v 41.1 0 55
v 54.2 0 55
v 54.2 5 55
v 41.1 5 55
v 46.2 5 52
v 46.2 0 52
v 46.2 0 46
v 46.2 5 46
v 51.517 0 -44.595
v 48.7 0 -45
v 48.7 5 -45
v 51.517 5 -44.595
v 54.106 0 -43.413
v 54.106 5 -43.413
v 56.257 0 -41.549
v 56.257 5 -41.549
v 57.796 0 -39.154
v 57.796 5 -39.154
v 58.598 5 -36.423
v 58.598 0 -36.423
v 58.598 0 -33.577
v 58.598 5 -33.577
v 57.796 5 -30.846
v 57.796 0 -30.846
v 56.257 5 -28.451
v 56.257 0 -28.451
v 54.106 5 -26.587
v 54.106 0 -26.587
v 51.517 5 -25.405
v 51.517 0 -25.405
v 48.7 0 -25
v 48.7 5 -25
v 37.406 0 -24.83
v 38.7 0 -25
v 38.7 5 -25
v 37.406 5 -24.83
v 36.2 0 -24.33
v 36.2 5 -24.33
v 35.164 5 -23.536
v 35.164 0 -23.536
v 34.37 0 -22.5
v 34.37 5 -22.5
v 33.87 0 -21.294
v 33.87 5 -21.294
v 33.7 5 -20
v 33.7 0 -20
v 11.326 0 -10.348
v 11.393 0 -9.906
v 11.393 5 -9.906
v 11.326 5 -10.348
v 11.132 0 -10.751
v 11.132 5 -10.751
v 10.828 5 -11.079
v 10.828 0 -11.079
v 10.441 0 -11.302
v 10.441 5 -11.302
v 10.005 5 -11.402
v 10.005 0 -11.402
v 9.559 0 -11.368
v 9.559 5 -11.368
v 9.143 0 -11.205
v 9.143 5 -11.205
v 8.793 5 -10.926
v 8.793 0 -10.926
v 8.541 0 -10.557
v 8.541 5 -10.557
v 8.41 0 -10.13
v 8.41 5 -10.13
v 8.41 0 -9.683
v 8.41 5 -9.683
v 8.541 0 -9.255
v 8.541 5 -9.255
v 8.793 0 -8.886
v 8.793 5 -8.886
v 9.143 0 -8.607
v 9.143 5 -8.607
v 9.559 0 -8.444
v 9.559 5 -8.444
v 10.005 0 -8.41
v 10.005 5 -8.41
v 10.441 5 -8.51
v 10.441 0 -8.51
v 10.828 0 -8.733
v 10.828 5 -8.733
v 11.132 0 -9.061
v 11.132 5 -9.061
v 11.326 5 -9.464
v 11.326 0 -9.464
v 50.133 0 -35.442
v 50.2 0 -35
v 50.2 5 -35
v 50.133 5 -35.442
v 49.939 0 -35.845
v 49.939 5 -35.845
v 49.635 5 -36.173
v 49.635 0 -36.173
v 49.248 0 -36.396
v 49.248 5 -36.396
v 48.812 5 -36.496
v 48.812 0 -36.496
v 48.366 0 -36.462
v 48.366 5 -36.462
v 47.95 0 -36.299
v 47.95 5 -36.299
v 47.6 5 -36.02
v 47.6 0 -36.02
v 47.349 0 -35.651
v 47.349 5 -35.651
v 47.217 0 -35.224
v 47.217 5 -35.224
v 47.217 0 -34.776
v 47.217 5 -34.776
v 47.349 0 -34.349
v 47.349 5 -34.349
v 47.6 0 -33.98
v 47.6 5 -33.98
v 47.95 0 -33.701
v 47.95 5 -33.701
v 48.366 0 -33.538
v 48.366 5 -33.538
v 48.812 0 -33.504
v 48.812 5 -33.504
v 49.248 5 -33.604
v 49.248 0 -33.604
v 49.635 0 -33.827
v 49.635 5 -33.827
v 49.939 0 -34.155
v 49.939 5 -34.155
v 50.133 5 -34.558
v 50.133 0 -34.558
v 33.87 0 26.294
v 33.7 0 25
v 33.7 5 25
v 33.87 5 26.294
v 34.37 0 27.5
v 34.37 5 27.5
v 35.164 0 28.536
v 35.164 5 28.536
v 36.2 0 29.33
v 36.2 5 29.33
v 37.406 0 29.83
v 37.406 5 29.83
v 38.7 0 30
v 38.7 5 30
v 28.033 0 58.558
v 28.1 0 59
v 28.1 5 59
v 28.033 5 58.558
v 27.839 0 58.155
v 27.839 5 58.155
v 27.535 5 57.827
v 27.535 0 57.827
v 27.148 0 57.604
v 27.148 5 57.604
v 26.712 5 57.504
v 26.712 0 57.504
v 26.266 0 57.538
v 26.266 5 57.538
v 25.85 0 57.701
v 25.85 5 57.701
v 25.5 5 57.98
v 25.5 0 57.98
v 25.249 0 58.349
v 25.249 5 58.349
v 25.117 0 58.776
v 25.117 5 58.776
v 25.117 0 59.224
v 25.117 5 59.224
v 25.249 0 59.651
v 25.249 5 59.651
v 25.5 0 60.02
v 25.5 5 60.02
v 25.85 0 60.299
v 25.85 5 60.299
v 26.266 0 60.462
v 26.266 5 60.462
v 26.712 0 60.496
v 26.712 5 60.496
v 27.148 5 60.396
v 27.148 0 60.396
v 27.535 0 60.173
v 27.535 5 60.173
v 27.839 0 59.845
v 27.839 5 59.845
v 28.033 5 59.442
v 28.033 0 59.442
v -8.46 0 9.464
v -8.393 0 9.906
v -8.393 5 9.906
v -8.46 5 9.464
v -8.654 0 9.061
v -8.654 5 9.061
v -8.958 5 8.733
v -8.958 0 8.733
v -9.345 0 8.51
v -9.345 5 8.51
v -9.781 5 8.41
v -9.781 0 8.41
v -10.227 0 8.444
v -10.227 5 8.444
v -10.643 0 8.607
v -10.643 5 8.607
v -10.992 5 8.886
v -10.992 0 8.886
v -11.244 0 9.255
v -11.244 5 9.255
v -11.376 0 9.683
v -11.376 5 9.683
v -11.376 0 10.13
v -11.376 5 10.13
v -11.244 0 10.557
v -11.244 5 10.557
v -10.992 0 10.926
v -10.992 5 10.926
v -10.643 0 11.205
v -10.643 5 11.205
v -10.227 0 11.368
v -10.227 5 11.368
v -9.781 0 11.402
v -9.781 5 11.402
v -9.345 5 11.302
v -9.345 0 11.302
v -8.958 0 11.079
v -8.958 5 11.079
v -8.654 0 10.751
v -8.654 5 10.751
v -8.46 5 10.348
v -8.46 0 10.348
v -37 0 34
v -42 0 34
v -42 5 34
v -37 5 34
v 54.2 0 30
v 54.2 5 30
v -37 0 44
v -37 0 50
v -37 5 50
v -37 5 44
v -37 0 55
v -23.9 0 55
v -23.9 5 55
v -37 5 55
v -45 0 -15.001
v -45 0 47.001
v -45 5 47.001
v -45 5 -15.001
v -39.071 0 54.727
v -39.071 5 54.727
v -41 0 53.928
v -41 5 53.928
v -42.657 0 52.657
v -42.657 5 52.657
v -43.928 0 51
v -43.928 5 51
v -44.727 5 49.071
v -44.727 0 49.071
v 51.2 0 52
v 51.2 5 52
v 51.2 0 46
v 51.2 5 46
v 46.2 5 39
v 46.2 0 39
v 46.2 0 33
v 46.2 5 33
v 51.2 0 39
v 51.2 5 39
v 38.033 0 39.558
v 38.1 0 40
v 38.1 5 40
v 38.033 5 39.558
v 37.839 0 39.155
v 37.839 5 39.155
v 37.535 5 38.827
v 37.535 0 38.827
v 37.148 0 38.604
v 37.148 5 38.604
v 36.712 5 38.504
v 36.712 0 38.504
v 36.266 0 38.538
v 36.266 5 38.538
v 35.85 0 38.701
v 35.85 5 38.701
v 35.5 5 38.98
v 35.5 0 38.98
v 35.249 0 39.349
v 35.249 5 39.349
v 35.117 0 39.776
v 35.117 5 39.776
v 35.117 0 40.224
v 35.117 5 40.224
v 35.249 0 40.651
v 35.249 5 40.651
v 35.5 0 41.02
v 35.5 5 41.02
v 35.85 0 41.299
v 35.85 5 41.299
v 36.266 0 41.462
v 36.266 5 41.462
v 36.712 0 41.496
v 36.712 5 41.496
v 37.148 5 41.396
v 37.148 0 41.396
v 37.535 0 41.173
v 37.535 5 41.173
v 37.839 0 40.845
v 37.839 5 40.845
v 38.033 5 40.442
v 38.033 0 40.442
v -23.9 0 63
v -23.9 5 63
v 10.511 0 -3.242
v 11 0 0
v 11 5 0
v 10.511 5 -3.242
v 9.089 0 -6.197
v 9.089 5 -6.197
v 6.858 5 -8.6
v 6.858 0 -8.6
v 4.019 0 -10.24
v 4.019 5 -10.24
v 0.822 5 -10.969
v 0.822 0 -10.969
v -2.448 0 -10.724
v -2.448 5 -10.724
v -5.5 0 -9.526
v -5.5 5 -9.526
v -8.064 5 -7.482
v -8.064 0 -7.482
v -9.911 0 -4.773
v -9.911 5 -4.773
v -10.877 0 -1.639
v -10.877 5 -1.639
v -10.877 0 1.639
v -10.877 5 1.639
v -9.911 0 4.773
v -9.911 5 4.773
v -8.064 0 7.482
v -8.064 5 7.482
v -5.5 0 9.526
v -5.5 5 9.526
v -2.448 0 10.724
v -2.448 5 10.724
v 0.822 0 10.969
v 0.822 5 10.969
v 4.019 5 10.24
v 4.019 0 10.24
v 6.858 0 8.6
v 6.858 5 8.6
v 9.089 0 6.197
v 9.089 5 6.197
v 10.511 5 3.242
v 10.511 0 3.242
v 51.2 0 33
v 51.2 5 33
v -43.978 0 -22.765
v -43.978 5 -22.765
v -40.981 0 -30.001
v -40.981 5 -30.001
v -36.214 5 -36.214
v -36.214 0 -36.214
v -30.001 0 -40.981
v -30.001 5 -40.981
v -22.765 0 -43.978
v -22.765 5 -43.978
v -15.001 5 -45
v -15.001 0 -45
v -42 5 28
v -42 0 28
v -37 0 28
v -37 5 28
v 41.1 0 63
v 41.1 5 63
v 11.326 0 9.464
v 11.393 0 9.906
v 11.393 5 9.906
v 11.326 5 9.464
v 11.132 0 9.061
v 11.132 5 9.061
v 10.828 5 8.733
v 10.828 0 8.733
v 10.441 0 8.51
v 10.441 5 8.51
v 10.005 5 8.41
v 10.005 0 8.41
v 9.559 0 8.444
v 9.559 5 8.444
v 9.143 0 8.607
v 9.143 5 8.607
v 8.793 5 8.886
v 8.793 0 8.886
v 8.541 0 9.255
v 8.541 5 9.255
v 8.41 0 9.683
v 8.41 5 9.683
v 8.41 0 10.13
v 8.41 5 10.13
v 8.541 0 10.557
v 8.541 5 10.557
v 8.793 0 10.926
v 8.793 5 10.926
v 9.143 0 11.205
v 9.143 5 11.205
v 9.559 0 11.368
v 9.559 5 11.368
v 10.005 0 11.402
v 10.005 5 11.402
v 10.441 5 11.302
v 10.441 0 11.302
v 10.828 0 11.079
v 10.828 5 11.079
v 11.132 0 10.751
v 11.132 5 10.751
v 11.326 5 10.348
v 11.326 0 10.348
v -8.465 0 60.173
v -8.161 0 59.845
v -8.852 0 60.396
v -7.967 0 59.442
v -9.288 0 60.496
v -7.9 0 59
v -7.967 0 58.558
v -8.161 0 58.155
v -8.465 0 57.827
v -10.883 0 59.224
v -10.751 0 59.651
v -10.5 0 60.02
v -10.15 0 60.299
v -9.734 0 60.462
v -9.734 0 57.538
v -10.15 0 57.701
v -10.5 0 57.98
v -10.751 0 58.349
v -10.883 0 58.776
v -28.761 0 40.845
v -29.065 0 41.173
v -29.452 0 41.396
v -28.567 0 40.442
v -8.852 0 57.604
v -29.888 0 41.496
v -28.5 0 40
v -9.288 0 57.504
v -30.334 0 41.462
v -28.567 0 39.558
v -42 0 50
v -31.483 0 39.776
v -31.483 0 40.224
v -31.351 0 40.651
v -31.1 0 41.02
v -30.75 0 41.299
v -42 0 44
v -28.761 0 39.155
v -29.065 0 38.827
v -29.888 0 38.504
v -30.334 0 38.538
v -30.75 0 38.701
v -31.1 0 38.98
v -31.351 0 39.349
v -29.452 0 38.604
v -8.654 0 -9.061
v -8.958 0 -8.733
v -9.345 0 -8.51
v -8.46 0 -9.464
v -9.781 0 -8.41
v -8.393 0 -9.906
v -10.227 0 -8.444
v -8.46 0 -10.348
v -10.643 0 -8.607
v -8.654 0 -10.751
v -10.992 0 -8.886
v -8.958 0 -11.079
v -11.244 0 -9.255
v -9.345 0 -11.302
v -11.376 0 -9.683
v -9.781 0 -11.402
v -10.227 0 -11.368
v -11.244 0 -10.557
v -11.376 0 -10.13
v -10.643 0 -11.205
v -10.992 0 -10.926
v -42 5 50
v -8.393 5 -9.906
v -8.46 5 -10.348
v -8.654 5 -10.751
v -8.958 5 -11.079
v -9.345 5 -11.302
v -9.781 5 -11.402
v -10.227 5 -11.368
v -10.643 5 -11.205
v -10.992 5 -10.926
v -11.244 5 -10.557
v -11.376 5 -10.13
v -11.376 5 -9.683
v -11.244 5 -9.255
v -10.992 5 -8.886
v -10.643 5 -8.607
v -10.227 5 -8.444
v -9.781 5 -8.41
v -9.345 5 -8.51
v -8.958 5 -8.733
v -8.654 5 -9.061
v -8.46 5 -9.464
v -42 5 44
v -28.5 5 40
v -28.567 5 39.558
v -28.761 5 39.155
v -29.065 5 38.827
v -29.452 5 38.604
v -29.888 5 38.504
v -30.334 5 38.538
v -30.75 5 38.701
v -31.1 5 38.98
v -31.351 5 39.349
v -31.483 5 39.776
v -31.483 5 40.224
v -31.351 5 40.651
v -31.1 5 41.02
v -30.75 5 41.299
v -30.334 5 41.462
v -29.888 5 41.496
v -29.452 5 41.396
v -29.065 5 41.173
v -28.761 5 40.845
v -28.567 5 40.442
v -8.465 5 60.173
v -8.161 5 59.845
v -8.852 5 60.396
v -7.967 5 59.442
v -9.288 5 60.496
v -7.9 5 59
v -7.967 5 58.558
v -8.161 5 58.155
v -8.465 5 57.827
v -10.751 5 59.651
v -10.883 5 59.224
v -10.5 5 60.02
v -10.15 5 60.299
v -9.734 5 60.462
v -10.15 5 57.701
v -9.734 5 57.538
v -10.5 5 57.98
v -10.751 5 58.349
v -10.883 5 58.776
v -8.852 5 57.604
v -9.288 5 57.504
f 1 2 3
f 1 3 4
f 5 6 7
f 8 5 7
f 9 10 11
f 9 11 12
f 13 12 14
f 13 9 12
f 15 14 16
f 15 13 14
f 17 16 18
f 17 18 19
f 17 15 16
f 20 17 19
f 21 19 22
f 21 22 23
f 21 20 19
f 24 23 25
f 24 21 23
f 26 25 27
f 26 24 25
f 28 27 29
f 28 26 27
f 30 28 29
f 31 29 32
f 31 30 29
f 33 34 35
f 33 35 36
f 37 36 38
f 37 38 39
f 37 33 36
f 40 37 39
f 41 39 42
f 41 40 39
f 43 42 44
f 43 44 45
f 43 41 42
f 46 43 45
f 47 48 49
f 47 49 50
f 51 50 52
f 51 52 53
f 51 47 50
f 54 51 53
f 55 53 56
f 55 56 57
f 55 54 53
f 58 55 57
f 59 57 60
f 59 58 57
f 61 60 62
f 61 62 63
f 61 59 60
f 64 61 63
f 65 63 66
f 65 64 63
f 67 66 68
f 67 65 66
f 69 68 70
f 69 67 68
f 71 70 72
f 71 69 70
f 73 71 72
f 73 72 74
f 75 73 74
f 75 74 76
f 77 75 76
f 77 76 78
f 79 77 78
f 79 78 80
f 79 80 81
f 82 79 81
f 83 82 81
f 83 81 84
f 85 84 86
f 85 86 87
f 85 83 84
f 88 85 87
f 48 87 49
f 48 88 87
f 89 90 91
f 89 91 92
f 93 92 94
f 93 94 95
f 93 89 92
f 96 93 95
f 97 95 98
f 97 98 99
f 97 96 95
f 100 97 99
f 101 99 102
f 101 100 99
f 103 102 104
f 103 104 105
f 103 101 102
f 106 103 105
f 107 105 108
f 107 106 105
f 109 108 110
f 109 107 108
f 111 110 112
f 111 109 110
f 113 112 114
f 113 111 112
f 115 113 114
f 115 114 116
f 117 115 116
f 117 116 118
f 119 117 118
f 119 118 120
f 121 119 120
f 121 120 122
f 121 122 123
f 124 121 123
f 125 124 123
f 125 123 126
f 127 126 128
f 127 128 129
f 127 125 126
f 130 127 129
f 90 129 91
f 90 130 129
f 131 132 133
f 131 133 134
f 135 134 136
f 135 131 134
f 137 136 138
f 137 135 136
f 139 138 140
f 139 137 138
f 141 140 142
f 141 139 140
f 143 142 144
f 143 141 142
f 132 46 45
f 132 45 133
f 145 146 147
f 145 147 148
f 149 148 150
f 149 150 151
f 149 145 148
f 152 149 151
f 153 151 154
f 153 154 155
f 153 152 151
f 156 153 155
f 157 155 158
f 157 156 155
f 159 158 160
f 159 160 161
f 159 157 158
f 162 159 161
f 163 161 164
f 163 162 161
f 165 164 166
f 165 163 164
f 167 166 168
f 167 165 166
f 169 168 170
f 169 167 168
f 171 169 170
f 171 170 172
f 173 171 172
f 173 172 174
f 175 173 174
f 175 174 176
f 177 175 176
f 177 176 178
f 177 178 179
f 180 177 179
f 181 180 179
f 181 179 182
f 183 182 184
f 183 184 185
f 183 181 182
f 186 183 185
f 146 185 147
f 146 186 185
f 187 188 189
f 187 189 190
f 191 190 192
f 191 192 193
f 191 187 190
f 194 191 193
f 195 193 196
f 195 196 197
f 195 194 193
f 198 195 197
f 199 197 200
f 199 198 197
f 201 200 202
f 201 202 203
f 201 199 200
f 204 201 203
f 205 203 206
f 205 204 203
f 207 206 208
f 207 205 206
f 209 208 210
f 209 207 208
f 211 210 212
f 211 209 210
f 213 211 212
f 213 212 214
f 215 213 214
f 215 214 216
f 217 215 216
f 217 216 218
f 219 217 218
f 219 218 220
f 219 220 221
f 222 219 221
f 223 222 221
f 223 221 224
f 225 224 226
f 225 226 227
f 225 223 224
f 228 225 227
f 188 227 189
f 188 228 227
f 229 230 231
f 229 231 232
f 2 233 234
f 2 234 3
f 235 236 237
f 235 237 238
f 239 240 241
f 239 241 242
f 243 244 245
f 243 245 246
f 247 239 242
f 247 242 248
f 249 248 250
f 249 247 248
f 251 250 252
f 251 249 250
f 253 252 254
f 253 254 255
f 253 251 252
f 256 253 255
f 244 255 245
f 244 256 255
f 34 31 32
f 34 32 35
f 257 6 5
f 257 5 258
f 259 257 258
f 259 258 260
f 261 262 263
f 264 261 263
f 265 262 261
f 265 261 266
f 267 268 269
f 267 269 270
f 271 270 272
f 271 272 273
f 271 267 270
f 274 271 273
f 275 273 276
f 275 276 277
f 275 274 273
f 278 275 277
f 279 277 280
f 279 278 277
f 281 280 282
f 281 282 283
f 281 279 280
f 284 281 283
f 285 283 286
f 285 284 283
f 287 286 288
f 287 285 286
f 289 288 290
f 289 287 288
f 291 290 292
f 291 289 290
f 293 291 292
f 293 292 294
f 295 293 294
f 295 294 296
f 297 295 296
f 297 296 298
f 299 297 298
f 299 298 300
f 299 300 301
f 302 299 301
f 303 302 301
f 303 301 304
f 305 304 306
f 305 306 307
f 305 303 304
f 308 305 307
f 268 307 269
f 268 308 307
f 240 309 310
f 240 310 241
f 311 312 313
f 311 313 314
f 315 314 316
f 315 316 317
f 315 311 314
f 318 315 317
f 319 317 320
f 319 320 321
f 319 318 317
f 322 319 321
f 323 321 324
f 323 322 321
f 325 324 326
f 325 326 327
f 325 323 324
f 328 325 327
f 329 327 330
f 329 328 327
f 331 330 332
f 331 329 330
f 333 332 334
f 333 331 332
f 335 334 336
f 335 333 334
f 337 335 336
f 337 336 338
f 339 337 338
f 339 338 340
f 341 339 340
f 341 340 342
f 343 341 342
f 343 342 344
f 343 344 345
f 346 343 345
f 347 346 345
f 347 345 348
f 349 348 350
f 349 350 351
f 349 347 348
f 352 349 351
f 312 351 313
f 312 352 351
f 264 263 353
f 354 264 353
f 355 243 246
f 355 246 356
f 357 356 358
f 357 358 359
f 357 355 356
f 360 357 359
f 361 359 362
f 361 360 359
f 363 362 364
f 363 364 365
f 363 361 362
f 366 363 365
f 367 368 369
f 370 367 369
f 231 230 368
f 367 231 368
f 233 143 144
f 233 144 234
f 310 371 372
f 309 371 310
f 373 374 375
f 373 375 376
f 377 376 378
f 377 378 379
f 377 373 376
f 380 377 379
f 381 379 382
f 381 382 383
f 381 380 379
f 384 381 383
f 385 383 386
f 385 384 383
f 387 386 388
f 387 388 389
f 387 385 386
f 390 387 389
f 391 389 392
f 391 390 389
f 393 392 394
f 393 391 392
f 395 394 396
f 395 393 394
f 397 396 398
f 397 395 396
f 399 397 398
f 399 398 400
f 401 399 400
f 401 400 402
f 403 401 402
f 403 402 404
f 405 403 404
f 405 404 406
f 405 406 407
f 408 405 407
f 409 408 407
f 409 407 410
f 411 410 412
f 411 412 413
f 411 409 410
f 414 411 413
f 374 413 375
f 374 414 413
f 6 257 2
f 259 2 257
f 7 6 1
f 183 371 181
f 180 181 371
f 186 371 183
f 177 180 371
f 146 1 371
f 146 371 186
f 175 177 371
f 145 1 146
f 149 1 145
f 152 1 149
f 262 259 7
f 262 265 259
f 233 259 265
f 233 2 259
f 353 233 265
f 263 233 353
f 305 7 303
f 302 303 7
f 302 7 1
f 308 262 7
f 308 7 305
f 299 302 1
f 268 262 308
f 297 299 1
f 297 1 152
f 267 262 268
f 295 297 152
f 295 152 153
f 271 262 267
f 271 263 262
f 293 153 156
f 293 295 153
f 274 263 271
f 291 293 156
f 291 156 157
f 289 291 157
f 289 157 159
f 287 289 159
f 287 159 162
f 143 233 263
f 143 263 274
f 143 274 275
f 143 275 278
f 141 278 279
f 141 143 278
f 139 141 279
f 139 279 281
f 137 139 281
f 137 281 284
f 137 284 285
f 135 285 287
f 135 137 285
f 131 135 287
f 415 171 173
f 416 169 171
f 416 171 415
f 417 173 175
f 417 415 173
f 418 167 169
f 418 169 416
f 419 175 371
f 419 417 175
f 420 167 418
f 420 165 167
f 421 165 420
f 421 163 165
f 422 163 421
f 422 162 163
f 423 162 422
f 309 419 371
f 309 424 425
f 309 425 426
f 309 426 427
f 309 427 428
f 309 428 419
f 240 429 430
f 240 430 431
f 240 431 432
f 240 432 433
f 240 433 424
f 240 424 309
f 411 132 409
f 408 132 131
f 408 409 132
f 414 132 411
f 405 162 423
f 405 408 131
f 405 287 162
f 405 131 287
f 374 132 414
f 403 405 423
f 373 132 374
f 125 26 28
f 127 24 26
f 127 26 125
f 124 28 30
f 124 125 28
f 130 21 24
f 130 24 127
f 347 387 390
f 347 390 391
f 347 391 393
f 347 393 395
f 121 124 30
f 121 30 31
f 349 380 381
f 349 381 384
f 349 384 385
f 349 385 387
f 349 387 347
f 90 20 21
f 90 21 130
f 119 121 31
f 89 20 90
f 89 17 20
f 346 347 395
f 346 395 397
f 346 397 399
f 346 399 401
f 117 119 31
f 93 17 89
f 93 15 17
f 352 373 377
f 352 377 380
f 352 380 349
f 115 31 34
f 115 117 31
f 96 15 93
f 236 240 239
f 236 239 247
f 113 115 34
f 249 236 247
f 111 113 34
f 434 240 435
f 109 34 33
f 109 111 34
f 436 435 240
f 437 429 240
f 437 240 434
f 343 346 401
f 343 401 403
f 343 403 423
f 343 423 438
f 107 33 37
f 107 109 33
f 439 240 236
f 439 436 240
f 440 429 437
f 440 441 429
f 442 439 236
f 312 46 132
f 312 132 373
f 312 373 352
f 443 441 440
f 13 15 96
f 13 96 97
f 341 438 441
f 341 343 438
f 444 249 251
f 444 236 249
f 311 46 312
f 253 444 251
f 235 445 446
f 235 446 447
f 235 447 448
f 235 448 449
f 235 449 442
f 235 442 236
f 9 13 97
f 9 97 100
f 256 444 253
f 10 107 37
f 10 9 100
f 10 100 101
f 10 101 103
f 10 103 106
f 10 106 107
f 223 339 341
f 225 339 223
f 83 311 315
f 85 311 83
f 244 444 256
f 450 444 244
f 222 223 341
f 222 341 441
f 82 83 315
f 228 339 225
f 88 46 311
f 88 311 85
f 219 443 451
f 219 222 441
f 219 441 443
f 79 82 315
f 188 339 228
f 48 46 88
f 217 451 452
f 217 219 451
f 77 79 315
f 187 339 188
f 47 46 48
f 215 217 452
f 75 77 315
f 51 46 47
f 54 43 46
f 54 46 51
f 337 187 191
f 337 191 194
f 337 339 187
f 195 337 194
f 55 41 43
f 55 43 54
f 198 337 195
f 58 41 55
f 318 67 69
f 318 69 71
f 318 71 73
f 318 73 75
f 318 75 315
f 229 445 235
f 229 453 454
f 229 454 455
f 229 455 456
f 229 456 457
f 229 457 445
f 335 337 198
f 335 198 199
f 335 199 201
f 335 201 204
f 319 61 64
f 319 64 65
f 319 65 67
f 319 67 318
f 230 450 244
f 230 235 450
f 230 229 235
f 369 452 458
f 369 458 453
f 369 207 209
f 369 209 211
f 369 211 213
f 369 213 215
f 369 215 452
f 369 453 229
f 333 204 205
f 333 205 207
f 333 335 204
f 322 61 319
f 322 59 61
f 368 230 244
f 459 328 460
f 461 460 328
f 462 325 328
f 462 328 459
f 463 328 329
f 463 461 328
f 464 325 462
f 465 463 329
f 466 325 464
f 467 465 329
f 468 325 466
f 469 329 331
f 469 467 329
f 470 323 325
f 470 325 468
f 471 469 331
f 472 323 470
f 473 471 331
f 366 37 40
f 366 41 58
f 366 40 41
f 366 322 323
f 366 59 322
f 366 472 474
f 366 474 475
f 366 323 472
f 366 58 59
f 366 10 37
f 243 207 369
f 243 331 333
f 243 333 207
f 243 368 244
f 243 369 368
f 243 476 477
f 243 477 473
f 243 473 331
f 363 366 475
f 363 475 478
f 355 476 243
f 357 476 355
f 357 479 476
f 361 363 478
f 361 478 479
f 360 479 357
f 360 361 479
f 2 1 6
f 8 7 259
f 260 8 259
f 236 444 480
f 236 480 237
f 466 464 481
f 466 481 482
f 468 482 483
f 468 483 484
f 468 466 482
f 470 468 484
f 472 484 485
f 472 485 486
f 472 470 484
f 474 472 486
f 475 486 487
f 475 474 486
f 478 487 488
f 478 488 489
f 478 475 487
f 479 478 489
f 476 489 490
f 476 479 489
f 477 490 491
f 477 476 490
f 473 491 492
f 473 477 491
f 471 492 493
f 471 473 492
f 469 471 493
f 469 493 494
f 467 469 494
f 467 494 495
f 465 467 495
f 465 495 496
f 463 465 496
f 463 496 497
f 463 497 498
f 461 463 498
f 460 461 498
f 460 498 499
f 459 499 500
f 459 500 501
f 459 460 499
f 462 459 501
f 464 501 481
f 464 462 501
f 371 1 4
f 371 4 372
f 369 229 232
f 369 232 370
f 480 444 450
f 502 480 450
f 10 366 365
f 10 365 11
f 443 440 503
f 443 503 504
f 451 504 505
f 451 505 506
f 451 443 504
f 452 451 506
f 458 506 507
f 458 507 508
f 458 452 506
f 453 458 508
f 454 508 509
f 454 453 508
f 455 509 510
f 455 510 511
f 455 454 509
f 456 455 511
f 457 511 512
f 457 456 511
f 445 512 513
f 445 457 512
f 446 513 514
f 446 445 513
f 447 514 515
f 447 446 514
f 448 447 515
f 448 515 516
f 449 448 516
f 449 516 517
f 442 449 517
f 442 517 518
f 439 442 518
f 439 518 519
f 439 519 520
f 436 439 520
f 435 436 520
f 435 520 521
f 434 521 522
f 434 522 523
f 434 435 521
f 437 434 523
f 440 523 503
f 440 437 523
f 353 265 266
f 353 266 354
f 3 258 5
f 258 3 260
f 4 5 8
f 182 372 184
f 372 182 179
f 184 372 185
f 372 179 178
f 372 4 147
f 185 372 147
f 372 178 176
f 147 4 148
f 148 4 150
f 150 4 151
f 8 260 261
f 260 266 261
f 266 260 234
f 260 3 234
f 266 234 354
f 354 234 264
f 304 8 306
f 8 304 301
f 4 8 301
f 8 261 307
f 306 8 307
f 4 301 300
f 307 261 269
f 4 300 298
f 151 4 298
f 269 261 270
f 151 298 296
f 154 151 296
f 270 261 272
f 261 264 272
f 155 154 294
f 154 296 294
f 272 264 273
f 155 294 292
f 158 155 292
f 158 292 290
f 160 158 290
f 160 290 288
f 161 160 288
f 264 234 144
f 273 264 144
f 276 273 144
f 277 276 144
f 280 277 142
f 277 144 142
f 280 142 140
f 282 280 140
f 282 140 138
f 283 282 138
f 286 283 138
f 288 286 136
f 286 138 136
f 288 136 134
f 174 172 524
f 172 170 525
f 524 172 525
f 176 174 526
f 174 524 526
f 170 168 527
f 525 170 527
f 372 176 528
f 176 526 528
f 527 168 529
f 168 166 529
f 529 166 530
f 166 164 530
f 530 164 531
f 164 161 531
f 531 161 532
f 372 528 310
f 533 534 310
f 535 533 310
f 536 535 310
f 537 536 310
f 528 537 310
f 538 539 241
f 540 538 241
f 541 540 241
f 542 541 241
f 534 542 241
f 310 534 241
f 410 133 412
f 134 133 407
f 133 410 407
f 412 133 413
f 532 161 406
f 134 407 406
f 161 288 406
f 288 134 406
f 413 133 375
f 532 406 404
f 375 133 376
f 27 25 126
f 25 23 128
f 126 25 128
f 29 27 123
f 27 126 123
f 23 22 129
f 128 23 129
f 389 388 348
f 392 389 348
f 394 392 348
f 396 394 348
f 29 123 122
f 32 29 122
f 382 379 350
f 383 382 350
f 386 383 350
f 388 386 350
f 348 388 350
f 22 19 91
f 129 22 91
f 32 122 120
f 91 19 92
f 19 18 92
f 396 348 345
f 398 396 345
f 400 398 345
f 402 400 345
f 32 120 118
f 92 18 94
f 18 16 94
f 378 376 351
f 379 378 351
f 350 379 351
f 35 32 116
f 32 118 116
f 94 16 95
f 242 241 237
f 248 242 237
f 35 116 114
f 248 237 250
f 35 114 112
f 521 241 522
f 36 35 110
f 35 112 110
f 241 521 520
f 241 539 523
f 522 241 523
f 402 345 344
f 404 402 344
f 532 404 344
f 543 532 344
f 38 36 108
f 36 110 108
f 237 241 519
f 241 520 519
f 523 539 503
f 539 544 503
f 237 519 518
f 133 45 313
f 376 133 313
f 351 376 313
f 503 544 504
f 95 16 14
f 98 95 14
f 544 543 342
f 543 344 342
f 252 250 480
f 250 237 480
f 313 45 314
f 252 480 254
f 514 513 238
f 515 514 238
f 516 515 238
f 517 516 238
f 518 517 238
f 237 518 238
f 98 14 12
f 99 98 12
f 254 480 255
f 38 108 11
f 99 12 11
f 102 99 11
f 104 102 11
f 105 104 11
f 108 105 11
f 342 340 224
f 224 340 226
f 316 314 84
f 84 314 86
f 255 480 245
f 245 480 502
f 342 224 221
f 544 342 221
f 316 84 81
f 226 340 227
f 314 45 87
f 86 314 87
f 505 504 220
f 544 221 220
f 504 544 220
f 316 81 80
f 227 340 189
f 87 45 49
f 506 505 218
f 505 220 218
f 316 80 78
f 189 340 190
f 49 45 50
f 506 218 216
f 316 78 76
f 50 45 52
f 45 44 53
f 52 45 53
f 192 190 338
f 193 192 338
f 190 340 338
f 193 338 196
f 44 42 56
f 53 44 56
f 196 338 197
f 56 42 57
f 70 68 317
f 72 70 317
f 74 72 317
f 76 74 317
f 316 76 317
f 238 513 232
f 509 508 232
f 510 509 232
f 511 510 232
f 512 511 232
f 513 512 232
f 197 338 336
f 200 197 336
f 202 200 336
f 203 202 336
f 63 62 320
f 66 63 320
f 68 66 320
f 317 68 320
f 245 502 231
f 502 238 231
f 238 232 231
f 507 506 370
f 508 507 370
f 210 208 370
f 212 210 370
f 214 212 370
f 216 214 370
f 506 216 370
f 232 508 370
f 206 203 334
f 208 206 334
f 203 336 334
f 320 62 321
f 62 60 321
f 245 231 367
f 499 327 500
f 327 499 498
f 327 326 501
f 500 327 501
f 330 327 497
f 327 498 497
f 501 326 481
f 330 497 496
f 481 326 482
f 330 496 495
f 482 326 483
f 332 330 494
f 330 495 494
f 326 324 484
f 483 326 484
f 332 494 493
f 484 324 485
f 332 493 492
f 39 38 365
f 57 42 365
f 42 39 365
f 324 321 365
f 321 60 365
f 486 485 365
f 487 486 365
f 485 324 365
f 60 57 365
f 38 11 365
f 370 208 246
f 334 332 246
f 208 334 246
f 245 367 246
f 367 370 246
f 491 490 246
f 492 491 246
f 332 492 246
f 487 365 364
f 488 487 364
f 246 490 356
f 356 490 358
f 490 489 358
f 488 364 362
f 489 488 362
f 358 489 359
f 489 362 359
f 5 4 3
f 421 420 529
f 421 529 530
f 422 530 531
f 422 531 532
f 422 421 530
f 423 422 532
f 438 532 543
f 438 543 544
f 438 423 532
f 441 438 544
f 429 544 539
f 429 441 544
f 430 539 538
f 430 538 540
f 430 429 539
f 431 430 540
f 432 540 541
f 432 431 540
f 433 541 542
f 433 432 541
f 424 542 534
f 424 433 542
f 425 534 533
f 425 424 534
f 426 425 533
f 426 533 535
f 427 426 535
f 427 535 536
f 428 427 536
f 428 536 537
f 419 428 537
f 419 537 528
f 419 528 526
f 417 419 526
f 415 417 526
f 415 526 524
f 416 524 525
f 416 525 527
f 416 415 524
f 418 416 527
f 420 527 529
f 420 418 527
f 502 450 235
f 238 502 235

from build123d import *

# Parameters (mm, degrees)
SKETCH1_R           = 11
SKETCH1_R_2         = 1.5
SKETCH1_W           = 5
SKETCH1_H           = 6
BOSS_EXTRUDE1_DEPTH = 5


with BuildPart() as part:
    # Sketch1 → Boss-Extrude1 (new body)
    with BuildSketch(Plane(origin=(0, 0, 0), x_dir=(1, 0, 0), z_dir=(0, 1, 0))):
        with BuildLine():
            Line((48.7, 25.000004028), (38.700001305, 25.000004028))
            ThreePointArc((38.700001305, 25.000004028), (35.164467017, 23.535538857), (33.7, 20.000005334))
            Line((33.7, 20.000005334), (33.7, -25))
            ThreePointArc((33.7, -25), (35.164465799, -28.535533784), (38.699999411, -30))
            Line((38.699999411, -30), (54.2, -30))
            Line((54.2, -30), (54.2, -55))
            Line((54.2, -55), (41.099999997, -55))
            Line((41.099999997, -55), (41.099999997, -63))
            Line((41.099999997, -63), (-23.900000003, -63))
            Line((-23.900000003, -63), (-23.900000003, -55))
            Line((-23.900000003, -55), (-37.00036842, -55))
            ThreePointArc((-37.00036842, -55), (-42.656802211, -52.657122122), (-45.000000024, -47.000820858))
            Line((-45.000000024, -47.000820858), (-45.000000024, 15.001139744))
            ThreePointArc((-45.000000024, 15.001139744), (-36.213537283, 36.213537259), (-15.001139768, 45))
            Line((-15.001139768, 45), (48.7, 45))
            ThreePointArc((48.7, 45), (58.699997986, 35.000002014), (48.7, 25.000004028))
        make_face()
        Circle(SKETCH1_R, mode=Mode.SUBTRACT)
        with Locations((9.89288341, 9.906102051)):
            Circle(SKETCH1_R_2, mode=Mode.SUBTRACT)
        with Locations((9.89288341, -9.906102051)):
            Circle(SKETCH1_R_2, mode=Mode.SUBTRACT)
        with Locations((-9.89288341, -9.906102051)):
            Circle(SKETCH1_R_2, mode=Mode.SUBTRACT)
        with Locations((-9.89288341, 9.906102051)):
            Circle(SKETCH1_R_2, mode=Mode.SUBTRACT)
        with Locations((-9.400000003, -59)):
            Circle(SKETCH1_R_2, mode=Mode.SUBTRACT)
        with Locations((26.599999997, -59)):
            Circle(SKETCH1_R_2, mode=Mode.SUBTRACT)
        with Locations((48.7, 35.000002014)):
            Circle(SKETCH1_R_2, mode=Mode.SUBTRACT)
        with Locations((-30.000000024, -40)):
            Circle(SKETCH1_R_2, mode=Mode.SUBTRACT)
        with Locations((36.599999976, -40)):
            Circle(SKETCH1_R_2, mode=Mode.SUBTRACT)
        with Locations((-39.500000024, -31)):
            Rectangle(SKETCH1_W, SKETCH1_H, mode=Mode.SUBTRACT)
        with Locations((-39.500000024, -47)):
            Rectangle(SKETCH1_W, SKETCH1_H, mode=Mode.SUBTRACT)
        with Locations((48.7, -36)):
            Rectangle(SKETCH1_W, SKETCH1_H, mode=Mode.SUBTRACT)
        with Locations((48.7, -49)):
            Rectangle(SKETCH1_W, SKETCH1_H, mode=Mode.SUBTRACT)
    extrude(amount=BOSS_EXTRUDE1_DEPTH)


solid = part.part
